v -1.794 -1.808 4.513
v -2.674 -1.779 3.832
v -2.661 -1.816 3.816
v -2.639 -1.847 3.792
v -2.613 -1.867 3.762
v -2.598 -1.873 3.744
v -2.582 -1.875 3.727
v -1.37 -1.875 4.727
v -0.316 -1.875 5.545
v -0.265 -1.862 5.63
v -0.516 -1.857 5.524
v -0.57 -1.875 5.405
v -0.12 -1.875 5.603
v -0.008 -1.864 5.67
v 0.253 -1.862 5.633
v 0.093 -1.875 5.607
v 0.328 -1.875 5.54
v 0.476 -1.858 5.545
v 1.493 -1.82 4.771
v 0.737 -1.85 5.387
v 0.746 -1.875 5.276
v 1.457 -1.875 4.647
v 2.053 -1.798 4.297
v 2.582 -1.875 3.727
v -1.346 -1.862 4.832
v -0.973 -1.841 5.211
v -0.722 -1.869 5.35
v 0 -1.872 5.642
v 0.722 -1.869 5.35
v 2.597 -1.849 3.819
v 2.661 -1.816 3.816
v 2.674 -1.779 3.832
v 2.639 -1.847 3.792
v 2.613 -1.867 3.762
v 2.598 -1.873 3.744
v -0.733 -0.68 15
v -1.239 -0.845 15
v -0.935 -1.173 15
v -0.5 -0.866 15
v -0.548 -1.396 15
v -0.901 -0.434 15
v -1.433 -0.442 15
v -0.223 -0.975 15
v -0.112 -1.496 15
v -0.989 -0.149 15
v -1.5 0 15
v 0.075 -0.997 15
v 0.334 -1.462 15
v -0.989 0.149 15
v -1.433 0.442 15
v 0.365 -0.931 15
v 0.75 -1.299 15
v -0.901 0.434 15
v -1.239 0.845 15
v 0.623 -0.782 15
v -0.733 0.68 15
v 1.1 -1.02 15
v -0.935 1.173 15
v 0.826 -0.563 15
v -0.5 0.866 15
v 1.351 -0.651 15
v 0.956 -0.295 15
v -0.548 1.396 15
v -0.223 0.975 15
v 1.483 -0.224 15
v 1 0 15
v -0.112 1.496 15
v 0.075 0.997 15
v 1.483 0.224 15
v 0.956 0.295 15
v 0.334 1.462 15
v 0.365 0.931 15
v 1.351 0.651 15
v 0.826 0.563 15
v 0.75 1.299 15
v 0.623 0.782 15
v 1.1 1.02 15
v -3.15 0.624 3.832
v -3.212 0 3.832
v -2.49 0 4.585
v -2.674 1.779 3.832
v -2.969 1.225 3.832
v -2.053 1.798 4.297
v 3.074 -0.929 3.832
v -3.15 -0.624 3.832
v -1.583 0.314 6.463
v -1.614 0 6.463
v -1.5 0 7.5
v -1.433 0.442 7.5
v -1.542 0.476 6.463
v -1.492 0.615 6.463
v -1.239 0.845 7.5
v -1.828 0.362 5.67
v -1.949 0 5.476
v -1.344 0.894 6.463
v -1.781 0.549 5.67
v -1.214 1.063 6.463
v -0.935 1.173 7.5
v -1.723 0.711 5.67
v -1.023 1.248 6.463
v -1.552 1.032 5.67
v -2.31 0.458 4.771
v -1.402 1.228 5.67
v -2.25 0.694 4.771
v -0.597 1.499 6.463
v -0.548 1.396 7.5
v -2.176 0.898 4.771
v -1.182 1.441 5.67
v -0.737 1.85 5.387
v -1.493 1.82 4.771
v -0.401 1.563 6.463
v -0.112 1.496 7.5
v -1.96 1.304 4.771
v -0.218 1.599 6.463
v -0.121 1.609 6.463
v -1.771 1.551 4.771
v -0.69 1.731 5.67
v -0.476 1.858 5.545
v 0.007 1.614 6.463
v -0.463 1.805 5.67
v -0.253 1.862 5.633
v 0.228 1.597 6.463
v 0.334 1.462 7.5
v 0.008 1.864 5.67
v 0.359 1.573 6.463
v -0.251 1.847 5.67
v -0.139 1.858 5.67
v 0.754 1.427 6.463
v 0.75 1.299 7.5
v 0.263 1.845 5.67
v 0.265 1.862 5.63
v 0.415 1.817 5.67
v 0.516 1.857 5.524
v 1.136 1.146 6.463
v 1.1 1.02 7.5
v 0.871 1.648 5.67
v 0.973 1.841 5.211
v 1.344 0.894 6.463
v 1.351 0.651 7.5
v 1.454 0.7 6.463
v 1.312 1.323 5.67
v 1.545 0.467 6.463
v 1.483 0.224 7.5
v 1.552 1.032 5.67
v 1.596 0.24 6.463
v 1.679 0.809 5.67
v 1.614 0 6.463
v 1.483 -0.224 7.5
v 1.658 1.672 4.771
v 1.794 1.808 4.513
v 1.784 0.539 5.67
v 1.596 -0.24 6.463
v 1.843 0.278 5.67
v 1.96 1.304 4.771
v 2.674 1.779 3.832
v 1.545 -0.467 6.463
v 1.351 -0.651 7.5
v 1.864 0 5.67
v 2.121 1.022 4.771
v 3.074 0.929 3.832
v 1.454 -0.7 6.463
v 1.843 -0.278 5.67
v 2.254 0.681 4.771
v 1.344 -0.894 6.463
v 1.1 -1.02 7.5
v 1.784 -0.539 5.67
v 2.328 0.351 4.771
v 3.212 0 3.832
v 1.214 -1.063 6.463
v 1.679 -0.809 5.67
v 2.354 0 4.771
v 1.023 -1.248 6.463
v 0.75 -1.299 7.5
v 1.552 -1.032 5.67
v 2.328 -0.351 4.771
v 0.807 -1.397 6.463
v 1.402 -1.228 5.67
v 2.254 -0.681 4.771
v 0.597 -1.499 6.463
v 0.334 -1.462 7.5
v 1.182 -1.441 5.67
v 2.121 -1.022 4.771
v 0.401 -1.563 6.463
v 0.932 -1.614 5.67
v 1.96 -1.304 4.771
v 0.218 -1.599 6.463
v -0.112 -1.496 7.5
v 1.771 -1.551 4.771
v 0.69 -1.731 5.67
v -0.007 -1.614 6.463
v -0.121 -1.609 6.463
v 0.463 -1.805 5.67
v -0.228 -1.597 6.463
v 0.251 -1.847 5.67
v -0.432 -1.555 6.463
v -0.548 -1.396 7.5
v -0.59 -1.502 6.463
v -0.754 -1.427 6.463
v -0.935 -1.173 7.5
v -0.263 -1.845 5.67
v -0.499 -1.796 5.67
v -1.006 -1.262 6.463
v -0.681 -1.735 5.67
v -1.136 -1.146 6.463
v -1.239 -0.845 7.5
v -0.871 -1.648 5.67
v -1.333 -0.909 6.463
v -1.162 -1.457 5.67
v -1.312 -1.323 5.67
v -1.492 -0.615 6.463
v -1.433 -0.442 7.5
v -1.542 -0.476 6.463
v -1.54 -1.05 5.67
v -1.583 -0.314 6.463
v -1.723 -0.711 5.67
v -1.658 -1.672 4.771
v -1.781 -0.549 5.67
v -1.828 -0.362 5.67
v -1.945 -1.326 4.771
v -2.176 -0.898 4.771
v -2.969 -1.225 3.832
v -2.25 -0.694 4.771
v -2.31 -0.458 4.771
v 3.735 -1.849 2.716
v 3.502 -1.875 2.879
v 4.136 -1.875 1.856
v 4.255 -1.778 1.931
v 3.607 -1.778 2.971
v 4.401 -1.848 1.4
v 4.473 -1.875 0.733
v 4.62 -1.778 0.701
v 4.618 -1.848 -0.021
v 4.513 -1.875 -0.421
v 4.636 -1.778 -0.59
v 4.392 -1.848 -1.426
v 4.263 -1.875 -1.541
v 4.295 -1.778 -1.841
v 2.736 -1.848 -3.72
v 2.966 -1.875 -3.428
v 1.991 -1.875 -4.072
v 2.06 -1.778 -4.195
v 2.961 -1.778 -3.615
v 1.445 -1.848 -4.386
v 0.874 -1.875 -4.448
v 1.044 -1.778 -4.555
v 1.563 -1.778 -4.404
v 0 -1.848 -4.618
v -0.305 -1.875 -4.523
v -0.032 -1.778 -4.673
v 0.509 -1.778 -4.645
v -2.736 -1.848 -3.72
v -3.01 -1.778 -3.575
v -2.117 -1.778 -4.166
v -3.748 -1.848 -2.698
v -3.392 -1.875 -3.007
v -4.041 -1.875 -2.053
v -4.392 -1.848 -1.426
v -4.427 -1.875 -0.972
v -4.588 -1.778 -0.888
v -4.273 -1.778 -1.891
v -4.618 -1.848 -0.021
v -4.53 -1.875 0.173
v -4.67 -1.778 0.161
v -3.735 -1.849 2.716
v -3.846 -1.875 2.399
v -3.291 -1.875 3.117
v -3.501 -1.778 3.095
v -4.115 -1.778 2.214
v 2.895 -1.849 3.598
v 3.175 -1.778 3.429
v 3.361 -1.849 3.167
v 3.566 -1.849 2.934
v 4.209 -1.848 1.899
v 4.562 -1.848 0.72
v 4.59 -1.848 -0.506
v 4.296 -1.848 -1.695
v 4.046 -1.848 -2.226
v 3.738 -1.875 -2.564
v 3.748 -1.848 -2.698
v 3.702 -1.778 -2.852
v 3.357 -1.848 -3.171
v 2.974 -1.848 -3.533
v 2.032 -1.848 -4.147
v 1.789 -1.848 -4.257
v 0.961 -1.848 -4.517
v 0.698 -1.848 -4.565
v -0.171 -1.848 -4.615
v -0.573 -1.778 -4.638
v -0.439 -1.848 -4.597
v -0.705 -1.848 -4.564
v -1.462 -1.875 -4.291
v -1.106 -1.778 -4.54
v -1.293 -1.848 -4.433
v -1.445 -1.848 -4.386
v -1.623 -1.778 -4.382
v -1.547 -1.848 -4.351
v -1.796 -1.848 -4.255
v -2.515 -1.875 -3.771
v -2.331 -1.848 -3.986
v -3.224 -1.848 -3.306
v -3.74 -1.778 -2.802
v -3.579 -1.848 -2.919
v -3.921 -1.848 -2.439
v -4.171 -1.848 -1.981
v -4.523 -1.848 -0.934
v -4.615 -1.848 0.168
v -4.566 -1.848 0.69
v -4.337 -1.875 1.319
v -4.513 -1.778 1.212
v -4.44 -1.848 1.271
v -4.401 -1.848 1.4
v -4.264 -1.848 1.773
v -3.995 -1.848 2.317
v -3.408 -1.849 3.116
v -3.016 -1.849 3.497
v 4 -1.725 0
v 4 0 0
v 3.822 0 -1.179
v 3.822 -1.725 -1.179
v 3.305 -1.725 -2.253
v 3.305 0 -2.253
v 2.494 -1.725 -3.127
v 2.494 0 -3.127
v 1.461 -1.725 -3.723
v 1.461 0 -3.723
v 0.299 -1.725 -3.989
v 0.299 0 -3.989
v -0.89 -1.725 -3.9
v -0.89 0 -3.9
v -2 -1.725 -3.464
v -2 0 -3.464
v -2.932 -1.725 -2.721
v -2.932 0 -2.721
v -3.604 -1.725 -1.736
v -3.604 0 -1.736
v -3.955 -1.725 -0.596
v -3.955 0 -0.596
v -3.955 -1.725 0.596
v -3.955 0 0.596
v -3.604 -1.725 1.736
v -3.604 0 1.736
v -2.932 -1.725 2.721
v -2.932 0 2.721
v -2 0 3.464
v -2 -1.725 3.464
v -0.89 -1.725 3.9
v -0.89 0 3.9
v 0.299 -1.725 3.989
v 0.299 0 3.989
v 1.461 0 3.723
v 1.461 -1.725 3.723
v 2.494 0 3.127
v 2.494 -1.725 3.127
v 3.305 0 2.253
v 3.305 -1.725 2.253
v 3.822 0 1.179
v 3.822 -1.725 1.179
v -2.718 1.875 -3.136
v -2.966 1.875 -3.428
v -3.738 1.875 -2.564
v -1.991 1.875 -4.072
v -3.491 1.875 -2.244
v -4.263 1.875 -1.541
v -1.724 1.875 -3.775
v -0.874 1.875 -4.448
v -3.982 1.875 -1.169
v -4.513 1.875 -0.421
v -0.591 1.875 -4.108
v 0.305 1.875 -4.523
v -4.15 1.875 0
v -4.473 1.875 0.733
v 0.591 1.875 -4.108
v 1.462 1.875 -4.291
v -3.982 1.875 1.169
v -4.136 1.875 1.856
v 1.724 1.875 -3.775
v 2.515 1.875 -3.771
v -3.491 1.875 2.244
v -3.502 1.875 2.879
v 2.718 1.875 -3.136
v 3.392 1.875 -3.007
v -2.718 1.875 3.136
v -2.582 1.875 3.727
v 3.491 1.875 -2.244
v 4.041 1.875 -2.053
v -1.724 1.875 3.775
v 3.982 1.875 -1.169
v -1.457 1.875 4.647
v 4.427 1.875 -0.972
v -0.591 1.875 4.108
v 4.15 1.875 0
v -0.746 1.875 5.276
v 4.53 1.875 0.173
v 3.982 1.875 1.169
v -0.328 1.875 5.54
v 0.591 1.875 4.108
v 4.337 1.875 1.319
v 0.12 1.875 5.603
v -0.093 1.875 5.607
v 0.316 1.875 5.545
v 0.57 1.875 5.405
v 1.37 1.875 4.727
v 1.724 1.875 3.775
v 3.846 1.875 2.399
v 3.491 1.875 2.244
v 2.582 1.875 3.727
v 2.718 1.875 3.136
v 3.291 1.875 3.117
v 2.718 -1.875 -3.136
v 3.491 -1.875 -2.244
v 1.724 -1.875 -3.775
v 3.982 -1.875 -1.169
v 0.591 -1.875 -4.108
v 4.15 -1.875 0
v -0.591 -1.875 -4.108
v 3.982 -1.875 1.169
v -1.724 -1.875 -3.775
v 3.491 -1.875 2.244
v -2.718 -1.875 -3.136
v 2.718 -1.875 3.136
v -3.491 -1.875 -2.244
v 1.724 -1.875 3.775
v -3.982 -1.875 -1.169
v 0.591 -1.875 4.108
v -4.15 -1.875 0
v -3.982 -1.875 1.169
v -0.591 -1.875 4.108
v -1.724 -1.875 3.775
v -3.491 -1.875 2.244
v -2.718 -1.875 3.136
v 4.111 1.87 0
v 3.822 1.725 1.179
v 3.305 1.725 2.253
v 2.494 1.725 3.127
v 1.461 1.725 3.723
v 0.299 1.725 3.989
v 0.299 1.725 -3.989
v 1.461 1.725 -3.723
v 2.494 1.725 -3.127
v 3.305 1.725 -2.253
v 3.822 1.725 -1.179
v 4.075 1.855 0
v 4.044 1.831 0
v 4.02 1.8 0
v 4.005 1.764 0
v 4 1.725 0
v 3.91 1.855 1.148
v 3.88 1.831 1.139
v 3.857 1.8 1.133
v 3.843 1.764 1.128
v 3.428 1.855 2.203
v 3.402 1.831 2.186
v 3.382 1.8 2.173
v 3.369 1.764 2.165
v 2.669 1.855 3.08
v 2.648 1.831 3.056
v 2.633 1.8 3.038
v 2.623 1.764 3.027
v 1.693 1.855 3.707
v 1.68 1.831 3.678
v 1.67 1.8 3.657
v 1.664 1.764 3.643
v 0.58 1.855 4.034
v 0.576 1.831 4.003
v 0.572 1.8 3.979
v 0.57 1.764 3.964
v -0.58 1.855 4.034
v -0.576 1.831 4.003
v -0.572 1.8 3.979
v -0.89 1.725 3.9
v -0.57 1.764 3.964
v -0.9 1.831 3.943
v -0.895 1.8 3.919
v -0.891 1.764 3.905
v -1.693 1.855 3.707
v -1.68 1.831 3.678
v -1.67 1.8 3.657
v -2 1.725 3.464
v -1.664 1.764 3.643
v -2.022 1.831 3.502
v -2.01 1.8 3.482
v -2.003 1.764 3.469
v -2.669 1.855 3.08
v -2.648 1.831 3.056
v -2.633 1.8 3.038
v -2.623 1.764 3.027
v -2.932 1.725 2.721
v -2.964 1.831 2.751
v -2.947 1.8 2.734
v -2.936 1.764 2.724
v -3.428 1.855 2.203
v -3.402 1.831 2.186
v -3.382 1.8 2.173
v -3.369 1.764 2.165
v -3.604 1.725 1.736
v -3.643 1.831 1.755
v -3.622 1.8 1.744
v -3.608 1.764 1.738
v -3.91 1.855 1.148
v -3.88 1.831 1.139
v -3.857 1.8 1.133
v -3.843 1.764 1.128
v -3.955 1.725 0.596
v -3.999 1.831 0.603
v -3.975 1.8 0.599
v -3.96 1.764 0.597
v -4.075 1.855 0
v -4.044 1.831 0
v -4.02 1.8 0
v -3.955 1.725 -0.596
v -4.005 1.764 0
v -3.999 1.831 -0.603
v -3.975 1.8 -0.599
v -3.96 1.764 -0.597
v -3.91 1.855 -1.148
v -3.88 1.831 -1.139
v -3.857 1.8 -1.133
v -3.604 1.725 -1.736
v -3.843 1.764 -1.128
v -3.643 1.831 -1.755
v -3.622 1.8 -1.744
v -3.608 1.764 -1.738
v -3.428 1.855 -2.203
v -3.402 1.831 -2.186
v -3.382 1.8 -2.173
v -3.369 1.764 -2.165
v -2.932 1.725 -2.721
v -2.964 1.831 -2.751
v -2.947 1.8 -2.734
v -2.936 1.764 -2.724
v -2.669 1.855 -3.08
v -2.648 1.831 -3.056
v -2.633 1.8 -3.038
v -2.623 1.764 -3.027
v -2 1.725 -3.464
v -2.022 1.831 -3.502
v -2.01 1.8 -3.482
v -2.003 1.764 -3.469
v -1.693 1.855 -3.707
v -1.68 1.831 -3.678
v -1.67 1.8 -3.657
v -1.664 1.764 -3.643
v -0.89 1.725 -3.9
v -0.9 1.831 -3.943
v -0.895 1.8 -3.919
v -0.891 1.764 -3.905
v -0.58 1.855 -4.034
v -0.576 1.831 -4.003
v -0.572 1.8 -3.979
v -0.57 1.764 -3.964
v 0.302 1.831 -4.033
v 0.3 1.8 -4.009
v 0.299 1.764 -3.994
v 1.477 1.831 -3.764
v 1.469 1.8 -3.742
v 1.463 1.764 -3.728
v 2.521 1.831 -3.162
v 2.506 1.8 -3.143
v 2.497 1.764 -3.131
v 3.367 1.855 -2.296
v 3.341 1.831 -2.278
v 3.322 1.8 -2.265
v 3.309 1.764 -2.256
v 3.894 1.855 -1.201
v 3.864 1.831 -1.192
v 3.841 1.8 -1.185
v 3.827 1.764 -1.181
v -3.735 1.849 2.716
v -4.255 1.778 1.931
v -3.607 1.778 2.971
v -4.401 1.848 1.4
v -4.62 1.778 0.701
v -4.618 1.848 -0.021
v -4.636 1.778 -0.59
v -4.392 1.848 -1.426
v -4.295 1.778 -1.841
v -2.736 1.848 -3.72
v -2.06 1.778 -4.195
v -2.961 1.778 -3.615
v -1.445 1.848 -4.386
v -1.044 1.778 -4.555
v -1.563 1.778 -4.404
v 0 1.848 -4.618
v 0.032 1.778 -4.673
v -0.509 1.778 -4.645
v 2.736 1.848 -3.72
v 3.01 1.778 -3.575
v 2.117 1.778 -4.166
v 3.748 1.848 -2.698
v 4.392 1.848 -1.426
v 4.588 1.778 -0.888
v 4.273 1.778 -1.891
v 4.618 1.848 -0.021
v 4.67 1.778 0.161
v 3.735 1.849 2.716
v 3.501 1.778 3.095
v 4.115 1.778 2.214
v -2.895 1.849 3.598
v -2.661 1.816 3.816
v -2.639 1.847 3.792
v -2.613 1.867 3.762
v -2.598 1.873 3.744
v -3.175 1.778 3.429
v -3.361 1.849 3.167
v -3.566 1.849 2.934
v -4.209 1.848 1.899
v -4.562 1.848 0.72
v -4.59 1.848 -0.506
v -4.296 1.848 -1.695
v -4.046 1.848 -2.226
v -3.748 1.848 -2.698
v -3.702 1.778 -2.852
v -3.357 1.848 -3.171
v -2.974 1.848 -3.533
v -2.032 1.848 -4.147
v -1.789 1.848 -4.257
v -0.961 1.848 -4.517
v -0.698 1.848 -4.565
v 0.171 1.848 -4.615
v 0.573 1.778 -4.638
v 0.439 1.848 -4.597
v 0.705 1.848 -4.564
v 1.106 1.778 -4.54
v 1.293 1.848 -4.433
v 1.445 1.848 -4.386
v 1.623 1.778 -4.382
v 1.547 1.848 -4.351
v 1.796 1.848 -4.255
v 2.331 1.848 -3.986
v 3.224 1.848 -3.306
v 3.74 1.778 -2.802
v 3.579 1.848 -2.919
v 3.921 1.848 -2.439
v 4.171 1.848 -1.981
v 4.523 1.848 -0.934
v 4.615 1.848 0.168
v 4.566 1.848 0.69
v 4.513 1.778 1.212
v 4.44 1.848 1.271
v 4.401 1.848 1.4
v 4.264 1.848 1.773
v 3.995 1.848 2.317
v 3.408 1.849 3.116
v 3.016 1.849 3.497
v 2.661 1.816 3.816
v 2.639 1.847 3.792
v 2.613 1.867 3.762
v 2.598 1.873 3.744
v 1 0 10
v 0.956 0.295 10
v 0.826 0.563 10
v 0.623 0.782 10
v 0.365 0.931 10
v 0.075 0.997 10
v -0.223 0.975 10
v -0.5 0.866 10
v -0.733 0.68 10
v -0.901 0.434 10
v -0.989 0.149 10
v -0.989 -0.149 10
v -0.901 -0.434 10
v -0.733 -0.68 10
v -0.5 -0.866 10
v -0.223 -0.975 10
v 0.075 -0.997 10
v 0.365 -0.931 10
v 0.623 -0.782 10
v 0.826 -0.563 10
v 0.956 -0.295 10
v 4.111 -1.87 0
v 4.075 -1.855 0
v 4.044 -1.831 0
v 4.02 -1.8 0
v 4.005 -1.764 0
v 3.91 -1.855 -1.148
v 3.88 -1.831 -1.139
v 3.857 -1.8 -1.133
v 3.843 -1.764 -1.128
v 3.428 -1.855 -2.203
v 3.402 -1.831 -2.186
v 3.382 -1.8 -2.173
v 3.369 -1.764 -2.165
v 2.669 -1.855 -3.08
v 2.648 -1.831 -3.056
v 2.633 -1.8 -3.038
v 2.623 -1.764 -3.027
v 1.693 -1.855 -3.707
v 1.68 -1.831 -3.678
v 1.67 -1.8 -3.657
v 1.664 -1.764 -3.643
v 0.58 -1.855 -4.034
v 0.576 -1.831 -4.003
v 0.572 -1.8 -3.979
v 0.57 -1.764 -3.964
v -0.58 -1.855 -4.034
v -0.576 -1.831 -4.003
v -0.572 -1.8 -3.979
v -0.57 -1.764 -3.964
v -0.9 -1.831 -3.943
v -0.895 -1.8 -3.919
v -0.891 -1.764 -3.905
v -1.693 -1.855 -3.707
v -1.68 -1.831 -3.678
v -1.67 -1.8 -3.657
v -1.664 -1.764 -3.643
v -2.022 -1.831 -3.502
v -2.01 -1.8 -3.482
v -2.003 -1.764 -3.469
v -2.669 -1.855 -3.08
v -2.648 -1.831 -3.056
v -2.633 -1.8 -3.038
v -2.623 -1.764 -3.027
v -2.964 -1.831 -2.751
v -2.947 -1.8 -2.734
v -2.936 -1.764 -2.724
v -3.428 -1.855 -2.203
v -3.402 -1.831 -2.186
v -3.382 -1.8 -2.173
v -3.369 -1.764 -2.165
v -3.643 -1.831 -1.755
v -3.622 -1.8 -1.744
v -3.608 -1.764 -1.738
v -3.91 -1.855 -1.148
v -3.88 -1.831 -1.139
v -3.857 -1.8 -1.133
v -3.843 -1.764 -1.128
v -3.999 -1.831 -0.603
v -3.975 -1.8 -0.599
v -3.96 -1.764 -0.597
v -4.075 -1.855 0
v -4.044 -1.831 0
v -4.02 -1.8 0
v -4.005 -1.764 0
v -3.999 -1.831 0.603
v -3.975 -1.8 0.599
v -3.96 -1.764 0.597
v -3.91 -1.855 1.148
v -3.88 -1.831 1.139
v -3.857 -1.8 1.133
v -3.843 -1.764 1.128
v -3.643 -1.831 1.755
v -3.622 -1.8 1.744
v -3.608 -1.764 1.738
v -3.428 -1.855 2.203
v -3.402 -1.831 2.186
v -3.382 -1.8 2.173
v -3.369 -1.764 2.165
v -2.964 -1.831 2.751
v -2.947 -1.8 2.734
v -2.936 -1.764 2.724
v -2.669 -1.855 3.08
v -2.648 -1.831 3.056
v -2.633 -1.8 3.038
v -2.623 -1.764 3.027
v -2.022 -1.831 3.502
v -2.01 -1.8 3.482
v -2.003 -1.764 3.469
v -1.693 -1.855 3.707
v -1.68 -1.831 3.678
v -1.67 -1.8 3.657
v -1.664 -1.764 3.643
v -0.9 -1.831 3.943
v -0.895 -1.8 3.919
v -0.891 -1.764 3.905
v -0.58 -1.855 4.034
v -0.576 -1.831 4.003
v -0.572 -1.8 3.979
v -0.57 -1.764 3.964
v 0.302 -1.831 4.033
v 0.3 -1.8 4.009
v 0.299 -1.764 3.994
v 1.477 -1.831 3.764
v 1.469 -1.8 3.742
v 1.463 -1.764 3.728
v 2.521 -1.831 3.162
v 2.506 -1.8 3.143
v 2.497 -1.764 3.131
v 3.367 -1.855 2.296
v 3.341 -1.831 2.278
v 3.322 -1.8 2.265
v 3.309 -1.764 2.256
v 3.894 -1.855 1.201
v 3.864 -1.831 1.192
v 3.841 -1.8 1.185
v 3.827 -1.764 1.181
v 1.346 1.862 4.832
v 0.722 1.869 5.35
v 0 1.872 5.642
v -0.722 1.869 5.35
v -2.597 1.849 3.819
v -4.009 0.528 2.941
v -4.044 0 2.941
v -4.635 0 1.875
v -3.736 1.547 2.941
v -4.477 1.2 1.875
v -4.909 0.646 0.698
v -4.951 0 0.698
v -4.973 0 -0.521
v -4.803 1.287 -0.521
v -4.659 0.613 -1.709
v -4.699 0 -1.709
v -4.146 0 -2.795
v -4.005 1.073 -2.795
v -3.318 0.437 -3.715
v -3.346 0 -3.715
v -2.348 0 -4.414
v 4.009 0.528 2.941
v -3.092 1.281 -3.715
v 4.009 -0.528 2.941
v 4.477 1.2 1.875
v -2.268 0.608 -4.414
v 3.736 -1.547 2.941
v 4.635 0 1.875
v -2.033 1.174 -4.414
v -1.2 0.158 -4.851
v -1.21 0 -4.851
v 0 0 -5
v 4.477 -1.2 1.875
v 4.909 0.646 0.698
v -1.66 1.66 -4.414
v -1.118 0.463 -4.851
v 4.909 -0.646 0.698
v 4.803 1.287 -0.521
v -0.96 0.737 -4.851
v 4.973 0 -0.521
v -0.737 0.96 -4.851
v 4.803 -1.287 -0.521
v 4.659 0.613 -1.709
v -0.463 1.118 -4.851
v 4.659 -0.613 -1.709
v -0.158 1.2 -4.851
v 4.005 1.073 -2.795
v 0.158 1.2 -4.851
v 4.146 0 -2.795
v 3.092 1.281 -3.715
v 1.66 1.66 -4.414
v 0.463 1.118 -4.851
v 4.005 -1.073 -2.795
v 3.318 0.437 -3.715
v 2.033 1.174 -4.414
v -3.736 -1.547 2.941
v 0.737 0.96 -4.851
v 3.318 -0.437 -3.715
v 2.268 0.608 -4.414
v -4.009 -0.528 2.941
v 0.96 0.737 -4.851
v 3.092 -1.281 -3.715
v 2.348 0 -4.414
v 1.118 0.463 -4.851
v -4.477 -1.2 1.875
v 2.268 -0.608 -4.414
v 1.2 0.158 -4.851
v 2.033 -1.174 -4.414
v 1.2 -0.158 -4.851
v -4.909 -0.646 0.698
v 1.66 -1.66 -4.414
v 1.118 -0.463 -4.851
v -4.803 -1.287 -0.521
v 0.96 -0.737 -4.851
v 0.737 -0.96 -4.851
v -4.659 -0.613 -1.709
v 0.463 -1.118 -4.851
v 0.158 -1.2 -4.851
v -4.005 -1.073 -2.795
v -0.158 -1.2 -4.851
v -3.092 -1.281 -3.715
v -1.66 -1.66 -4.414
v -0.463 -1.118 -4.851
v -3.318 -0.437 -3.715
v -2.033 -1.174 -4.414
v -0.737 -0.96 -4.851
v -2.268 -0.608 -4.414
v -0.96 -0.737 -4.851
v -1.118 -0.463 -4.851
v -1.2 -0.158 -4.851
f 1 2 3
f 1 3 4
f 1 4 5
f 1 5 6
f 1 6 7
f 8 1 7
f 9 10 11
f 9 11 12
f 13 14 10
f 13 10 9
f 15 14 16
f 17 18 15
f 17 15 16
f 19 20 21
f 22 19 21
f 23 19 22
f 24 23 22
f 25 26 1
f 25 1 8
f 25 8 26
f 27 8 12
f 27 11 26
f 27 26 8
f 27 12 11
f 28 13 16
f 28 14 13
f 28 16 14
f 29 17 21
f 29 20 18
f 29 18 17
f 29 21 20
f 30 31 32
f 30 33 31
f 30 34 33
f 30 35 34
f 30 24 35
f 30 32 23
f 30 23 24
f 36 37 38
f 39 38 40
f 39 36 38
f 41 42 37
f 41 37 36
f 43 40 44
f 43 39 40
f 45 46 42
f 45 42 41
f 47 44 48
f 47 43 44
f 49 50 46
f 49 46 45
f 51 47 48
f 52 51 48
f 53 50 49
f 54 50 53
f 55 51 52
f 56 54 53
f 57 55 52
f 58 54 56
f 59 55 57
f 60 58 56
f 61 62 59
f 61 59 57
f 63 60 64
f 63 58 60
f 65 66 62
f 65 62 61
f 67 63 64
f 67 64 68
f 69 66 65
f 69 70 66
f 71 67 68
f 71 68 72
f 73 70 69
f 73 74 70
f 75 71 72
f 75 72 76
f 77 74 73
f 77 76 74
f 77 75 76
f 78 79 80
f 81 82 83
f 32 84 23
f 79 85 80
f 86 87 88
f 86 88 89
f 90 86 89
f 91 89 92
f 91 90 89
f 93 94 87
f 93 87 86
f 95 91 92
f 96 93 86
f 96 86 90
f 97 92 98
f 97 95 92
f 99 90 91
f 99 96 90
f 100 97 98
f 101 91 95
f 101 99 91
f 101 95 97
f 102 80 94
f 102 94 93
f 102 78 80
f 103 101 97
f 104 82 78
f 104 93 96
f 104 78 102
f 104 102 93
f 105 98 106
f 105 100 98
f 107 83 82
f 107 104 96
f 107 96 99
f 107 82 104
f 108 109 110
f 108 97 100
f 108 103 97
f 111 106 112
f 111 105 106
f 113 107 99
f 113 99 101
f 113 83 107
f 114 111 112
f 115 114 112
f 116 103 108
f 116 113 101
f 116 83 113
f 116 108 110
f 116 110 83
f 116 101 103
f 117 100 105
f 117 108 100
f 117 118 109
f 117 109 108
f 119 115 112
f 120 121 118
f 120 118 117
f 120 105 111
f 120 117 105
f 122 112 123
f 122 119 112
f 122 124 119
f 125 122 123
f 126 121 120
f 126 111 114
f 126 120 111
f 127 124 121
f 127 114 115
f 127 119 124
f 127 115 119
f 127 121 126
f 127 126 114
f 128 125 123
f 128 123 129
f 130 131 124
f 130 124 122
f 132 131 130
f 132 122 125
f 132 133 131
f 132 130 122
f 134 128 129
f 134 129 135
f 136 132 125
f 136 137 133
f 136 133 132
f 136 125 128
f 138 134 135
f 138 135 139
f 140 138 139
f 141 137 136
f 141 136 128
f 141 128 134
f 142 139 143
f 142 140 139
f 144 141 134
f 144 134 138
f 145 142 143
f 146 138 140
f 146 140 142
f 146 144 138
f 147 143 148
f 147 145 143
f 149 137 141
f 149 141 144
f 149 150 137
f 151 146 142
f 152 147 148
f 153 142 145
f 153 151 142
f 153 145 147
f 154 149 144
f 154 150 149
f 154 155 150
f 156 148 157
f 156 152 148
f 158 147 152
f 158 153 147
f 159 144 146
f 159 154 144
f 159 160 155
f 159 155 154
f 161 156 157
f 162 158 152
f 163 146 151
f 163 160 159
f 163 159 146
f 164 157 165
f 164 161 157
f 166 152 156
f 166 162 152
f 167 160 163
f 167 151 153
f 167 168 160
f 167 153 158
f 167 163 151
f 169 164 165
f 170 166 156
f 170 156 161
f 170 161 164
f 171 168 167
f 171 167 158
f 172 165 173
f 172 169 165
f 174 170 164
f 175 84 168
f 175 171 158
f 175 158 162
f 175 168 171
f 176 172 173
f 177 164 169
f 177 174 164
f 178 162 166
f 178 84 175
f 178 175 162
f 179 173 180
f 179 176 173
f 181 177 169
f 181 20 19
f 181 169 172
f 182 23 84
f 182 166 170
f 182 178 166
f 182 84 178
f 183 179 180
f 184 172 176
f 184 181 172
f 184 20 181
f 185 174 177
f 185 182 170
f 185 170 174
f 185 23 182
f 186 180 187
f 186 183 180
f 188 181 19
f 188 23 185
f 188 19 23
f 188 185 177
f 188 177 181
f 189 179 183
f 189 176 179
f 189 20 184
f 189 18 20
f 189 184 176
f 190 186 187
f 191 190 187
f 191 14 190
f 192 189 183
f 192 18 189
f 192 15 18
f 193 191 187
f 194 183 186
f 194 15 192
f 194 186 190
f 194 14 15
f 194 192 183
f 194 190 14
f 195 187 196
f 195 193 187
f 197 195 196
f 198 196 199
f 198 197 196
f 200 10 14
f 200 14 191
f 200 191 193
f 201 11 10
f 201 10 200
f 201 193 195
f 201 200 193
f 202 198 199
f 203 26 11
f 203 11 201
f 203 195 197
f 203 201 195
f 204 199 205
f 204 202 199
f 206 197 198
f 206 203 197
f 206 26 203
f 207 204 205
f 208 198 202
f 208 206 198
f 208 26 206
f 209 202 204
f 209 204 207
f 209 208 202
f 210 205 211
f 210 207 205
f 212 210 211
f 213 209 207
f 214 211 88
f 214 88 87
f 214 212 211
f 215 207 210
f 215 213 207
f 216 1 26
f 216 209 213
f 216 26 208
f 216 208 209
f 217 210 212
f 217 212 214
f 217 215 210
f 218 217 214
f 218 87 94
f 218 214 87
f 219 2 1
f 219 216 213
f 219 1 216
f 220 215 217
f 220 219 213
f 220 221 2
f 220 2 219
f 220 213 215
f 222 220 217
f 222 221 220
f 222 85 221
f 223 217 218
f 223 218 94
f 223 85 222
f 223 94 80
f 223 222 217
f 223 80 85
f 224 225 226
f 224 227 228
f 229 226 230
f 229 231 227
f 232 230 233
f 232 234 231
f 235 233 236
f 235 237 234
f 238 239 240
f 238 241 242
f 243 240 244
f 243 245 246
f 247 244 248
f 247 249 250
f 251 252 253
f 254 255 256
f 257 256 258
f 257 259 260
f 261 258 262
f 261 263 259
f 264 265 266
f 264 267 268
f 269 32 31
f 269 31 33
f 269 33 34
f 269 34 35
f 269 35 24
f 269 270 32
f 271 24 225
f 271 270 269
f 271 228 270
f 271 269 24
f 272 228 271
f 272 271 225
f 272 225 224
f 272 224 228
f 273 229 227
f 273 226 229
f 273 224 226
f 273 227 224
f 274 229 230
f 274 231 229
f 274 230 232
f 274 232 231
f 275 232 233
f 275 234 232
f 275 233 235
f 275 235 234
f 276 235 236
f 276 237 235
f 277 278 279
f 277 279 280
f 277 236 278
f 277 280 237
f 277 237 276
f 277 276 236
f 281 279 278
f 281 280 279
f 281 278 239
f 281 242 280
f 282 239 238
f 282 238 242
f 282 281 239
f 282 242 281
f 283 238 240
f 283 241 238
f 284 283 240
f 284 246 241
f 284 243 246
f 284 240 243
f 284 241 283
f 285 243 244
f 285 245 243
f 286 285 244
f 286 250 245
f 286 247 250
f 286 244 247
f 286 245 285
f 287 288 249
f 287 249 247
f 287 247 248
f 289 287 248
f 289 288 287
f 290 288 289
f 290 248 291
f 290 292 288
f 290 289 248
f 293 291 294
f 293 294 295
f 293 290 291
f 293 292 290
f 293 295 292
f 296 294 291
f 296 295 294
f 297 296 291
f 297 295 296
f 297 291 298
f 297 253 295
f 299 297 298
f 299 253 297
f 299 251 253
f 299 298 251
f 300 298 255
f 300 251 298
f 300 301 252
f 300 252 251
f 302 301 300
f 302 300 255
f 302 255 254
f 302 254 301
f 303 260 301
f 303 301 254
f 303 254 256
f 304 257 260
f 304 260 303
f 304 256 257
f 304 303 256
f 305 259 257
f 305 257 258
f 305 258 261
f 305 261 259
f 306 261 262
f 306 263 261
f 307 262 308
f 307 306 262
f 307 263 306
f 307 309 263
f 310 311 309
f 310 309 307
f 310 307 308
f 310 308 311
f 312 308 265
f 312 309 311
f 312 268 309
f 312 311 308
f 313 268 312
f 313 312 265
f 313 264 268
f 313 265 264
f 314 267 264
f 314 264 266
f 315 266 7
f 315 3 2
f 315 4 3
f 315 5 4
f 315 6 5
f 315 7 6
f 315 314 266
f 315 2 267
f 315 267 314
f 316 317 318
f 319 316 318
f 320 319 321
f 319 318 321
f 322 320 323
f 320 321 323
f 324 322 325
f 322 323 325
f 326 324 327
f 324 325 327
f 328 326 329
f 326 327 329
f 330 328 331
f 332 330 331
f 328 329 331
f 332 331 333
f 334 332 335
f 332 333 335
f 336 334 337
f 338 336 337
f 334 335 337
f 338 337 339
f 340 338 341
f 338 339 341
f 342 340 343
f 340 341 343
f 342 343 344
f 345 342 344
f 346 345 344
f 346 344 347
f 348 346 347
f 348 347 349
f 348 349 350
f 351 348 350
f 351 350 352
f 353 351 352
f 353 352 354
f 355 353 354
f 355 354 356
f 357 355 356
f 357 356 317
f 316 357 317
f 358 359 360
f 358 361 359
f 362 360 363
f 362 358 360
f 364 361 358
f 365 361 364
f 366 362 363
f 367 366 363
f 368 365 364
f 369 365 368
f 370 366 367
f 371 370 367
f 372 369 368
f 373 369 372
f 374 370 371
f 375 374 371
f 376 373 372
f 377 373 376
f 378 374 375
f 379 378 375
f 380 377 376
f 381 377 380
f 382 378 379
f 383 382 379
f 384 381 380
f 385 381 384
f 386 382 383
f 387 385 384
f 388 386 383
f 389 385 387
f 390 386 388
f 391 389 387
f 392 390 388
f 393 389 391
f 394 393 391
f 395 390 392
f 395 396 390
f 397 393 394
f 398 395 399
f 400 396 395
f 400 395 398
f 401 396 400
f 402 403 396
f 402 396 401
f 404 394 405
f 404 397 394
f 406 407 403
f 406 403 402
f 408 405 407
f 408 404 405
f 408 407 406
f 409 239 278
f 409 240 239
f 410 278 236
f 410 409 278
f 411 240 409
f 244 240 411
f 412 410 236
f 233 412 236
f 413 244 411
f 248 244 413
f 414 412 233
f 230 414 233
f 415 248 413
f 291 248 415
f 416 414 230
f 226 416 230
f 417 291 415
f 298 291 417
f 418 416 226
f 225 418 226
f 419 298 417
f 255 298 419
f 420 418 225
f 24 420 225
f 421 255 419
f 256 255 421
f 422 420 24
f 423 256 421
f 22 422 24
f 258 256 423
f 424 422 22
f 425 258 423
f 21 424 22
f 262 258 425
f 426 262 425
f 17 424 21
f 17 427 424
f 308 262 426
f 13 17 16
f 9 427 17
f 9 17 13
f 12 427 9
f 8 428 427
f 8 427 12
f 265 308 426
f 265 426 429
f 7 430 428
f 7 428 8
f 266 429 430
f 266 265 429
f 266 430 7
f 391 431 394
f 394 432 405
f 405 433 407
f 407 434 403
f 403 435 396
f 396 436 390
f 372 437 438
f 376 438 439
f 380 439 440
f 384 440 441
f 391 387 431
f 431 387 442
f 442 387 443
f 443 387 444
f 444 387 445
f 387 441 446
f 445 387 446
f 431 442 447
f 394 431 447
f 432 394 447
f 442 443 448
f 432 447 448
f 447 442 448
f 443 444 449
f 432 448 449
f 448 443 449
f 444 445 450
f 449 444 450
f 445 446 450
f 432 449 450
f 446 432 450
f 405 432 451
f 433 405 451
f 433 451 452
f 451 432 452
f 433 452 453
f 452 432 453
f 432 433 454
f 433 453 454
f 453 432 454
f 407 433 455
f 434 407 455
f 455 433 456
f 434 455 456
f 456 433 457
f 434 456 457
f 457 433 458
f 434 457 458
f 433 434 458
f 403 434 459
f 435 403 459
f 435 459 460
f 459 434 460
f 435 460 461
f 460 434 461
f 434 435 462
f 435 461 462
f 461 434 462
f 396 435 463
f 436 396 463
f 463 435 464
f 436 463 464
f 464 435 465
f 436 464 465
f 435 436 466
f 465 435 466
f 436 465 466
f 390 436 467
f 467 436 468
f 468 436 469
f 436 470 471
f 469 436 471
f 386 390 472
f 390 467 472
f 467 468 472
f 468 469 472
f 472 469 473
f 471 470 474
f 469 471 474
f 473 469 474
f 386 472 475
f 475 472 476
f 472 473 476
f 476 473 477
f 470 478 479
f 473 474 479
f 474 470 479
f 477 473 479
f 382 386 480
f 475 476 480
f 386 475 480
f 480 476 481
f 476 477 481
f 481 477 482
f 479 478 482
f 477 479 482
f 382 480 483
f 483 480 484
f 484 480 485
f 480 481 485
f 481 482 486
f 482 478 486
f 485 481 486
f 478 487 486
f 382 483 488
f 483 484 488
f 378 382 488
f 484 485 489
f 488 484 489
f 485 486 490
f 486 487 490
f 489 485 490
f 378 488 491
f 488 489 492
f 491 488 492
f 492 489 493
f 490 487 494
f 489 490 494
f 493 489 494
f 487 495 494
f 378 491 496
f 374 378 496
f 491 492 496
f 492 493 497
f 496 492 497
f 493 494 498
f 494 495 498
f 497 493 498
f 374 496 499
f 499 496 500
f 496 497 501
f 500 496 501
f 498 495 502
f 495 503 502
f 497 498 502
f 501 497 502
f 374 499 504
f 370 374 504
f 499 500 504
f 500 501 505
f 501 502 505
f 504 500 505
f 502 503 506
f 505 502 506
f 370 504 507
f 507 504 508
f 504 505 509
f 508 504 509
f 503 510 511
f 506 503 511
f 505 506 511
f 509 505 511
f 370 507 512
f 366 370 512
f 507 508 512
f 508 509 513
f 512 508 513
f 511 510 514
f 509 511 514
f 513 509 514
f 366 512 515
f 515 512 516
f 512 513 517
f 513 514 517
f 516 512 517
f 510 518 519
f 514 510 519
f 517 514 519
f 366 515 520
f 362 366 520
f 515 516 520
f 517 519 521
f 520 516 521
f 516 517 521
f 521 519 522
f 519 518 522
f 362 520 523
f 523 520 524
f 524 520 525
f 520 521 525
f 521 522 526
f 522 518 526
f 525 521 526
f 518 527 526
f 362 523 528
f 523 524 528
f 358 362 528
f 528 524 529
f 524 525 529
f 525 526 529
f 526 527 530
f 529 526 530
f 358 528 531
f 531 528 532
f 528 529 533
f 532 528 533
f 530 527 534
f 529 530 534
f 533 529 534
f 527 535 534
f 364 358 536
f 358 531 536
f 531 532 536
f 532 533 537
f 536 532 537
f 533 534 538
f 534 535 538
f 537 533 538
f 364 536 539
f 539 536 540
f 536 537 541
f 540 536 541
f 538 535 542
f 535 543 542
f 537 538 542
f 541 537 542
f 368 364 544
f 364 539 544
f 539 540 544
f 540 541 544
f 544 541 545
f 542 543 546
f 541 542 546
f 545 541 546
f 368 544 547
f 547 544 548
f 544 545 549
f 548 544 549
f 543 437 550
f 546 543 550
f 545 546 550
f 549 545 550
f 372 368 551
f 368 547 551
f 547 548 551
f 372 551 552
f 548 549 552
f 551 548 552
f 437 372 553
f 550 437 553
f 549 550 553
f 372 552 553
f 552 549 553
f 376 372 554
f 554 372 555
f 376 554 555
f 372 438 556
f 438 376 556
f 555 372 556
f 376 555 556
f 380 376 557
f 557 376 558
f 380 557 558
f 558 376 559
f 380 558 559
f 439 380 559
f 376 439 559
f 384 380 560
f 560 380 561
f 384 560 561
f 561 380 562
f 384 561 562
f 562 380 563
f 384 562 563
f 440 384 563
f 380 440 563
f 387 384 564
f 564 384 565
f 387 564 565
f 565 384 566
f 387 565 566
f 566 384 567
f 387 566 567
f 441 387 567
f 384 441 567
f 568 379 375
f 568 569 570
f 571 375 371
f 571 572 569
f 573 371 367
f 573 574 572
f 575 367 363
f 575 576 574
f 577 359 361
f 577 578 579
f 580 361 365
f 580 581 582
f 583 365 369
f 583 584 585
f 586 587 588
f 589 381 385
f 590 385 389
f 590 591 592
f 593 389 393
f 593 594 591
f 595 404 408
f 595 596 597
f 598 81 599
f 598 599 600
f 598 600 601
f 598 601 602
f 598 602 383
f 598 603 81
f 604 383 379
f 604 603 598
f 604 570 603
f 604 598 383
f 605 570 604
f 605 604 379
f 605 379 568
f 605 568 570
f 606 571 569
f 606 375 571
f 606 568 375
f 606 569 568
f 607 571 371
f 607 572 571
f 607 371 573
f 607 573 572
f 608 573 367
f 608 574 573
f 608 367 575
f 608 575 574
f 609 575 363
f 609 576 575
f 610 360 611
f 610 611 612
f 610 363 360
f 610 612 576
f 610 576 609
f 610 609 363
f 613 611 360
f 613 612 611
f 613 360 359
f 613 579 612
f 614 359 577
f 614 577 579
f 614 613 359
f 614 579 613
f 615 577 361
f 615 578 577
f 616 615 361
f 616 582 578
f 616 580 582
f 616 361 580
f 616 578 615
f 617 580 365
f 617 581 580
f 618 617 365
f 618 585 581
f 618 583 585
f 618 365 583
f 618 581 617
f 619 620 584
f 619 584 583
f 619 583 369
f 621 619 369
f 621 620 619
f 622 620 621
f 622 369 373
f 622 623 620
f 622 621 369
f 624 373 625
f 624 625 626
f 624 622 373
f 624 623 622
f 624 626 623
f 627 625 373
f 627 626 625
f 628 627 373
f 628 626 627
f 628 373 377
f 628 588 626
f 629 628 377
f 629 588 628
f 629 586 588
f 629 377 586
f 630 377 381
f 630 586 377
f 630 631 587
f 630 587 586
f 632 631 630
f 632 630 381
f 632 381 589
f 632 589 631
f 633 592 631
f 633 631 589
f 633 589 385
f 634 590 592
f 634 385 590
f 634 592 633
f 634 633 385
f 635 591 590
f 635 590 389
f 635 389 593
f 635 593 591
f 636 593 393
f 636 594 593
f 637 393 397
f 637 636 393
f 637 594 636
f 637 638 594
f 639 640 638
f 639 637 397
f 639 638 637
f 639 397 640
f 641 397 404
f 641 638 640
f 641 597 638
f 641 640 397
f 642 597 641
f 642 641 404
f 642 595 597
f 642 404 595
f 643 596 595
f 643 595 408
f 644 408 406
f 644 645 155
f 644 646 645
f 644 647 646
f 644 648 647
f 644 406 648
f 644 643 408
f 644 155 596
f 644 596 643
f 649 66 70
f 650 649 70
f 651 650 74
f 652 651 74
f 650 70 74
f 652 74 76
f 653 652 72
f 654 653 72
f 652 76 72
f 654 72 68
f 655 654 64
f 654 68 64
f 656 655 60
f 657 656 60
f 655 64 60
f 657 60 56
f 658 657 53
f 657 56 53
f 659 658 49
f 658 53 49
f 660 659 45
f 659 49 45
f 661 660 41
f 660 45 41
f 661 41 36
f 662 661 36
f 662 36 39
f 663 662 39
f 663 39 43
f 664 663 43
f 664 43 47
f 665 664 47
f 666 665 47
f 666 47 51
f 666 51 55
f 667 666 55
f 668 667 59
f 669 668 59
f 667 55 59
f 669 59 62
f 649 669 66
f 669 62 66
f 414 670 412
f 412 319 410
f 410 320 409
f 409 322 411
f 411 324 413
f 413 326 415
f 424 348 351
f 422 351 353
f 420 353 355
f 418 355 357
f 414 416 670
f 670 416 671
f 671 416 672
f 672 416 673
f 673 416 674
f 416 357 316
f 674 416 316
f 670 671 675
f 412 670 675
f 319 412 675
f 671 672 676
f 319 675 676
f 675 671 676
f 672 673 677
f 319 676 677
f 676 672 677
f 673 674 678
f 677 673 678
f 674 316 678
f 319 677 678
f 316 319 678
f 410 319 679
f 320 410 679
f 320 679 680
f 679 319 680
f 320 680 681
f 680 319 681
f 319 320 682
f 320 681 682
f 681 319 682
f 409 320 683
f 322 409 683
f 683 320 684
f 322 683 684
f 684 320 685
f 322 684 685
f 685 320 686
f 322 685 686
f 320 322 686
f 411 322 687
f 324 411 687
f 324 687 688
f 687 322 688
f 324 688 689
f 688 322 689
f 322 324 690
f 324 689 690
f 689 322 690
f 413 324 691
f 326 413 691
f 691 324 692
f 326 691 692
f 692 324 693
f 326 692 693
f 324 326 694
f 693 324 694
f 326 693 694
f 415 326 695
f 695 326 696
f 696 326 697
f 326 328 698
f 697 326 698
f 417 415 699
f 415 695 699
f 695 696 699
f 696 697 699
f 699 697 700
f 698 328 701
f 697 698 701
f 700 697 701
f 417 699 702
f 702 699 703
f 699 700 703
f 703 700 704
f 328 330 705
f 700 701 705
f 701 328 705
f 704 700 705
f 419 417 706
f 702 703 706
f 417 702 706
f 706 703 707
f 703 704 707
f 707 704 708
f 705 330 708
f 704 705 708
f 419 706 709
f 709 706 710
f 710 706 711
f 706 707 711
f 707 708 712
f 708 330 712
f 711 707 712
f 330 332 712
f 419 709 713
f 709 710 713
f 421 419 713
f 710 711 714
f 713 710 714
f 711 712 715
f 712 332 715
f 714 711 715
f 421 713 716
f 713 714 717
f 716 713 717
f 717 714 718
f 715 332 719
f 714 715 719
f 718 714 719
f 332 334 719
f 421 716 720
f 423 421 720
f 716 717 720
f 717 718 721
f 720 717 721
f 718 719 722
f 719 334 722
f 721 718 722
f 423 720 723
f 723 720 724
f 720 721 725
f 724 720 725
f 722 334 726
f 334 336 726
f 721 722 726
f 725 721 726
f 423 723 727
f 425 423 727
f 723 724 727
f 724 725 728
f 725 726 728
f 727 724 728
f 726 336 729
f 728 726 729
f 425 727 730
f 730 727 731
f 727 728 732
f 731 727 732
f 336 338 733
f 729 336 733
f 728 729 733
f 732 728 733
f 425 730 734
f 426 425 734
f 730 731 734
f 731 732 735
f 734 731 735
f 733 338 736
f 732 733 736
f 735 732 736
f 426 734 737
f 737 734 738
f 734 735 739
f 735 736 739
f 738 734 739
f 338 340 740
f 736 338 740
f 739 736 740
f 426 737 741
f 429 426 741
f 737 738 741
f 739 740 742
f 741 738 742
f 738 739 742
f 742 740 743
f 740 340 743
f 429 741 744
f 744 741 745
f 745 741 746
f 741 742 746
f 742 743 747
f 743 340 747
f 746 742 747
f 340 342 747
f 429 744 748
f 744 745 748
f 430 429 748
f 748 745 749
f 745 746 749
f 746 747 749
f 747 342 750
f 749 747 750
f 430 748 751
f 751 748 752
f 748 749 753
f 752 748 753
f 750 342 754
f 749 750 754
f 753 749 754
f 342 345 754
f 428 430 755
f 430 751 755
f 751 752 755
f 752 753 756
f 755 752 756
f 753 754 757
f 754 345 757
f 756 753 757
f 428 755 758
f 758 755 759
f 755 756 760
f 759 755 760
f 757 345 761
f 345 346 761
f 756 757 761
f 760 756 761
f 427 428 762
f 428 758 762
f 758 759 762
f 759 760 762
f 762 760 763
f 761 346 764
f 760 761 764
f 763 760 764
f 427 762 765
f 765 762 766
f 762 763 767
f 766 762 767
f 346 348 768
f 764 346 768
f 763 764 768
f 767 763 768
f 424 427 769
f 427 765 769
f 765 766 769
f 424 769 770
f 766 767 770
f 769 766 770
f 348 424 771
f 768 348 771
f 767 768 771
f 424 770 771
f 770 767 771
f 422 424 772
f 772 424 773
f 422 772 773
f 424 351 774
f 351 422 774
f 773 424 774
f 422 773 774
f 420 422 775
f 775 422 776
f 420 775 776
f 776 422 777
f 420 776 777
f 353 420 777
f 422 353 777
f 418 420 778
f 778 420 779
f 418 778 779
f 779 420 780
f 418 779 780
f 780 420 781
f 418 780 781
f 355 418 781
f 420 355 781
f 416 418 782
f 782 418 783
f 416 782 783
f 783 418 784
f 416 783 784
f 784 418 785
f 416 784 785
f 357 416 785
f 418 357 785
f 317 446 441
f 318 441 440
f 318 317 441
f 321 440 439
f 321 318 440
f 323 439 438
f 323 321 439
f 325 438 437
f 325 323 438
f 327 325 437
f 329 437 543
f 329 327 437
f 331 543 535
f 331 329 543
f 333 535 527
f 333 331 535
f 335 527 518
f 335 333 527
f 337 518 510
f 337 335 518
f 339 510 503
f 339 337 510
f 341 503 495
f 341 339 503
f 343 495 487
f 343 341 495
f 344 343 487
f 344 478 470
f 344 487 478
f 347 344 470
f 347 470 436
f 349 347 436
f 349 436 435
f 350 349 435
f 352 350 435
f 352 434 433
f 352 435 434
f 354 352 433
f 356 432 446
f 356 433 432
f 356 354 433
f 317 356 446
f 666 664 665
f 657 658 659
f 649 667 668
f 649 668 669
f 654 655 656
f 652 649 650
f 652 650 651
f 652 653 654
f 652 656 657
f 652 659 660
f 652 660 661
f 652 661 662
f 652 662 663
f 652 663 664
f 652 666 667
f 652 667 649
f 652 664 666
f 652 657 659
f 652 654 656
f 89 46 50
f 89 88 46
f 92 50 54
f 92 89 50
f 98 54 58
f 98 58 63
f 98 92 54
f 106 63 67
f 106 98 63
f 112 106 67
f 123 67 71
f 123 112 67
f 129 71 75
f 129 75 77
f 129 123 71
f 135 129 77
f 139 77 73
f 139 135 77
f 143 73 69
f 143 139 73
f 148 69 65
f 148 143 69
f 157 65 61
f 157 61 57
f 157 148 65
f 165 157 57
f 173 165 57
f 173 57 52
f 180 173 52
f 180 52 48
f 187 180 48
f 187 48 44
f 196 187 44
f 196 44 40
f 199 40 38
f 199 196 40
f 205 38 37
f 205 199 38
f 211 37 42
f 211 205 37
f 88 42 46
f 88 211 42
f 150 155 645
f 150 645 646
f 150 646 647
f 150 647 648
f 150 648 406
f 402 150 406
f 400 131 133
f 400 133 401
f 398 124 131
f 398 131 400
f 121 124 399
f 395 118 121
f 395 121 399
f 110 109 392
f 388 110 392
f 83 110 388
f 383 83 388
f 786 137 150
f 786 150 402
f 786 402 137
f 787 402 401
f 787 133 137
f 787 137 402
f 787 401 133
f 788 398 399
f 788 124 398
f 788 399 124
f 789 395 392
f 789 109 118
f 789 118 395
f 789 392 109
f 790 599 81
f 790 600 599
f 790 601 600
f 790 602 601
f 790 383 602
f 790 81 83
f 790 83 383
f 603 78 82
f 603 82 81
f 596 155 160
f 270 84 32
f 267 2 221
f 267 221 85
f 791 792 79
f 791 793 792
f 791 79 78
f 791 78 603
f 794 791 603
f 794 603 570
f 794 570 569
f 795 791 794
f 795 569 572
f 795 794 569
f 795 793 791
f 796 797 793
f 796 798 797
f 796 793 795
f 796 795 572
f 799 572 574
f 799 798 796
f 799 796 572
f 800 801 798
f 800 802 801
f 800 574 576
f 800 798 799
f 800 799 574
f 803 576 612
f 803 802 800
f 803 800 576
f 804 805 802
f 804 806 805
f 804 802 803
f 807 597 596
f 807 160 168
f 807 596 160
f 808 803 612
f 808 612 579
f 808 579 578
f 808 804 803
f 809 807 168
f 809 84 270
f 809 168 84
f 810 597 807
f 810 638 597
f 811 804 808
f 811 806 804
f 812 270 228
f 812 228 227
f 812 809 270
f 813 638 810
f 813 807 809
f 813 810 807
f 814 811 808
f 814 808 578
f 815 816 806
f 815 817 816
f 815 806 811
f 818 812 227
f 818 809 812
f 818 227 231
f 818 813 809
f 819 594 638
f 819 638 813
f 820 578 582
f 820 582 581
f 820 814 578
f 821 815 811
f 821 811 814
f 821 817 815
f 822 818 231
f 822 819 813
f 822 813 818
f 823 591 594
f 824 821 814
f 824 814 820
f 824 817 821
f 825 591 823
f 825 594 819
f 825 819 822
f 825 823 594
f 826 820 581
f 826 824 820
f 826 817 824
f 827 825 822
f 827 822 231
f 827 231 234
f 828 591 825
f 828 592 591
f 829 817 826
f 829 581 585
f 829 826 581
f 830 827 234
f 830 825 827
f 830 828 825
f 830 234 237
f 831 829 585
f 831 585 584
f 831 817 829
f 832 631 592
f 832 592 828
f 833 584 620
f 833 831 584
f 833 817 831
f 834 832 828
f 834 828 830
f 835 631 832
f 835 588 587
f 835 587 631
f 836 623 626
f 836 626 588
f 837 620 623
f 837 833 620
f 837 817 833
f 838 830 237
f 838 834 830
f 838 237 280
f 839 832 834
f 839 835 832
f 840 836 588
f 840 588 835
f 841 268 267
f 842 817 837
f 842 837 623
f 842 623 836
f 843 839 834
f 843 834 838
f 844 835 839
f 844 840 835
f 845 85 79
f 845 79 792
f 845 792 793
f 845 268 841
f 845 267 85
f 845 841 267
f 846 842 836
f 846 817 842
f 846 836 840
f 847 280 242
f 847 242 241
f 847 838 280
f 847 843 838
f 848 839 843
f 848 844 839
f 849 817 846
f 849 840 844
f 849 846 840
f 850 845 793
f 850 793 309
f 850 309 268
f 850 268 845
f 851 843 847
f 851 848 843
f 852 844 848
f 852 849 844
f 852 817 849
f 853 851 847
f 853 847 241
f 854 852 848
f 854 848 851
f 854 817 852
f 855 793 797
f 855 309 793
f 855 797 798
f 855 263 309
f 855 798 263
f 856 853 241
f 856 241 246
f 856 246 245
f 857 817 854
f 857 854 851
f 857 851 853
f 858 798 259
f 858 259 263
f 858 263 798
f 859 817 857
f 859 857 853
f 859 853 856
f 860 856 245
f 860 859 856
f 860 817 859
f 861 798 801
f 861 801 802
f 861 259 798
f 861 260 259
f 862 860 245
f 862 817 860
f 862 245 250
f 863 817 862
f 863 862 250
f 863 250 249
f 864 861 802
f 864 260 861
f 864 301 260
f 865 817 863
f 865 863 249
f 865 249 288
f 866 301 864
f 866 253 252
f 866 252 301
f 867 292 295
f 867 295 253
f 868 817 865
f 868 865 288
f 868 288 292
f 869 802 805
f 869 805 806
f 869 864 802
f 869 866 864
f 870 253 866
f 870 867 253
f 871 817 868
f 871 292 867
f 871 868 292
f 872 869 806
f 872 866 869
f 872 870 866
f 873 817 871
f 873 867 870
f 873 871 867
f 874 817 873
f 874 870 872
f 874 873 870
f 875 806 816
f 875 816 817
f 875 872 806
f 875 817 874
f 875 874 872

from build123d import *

# Parameters (mm, degrees)
CUT_EXTRUDE1_DEPTH      = 6
CUT_EXTRUDE1_DEPTH_BACK = 6
SKETCH5_R               = 4
CUT_EXTRUDE2_DEPTH      = 2.8750001
CUT_EXTRUDE2_DEPTH_BACK = 2.8750001
FILLET1_R               = 0.15
SKETCH6_R               = 1
CUT_EXTRUDE3_DEPTH      = 5


with BuildPart() as part:
    # Sketch2 → Revolve1 (revolve)
    with BuildSketch(Plane(origin=(0, 0, 0), x_dir=(1, 0, 0), z_dir=(0, 1, 0))):
        with BuildLine():
            Line((-1.5, -15), (-1.5, -7.5))
            ThreePointArc((-1.5, -7.5), (-1.948980687, -5.476190987), (-3.211678832, -3.832116788))
            ThreePointArc((-3.211678832, -3.832116788), (-4.698967117, 1.708715315), (0, 5))
            Line((0, 5), (0, -15))
            Line((0, -15), (-1.5, -15))
        make_face()
    revolve(axis=Axis((0, 0, 0), (0, 0, -1)))

    # Sketch4 → Cut-Extrude1 (cut, two sides)
    with BuildSketch(Plane(origin=(0, 0, 0), x_dir=(0, 0, -1), z_dir=(1, 0, 0))) as cut_extrude1_sk:
        with BuildLine():
            Line((8.781517746, 1.875), (-9.267406652, 1.875))
            ThreePointArc((-9.267406652, 1.875), (-10.77093565, 2.106415246), (-12.135288834, 2.779239779))
            Line((-12.135288834, 2.779239779), (-18.987551921, 7.577246046))
            Line((-18.987551921, 7.577246046), (8.781517746, 7.577246046))
            Line((8.781517746, 7.577246046), (8.781517746, 1.875))
        make_face()
        with BuildLine():
            Line((8.781517746, -7.577246046), (8.781517746, -1.875))
            Line((8.781517746, -1.875), (-9.267406652, -1.875))
            ThreePointArc((-9.267406652, -1.875), (-10.77093565, -2.106415246), (-12.135288834, -2.779239779))
            Line((-12.135288834, -2.779239779), (-18.987551921, -7.577246046))
            Line((-18.987551921, -7.577246046), (8.781517746, -7.577246046))
        make_face()
    extrude(amount=CUT_EXTRUDE1_DEPTH, mode=Mode.SUBTRACT)
    extrude(cut_extrude1_sk.sketch, amount=-CUT_EXTRUDE1_DEPTH_BACK, mode=Mode.SUBTRACT)

    # Sketch5 → Cut-Extrude2 (cut, two sides)
    with BuildSketch(Plane(origin=(0, 0, 0), x_dir=(1, 0, 0), z_dir=(0, 1, 0))) as cut_extrude2_sk:
        Circle(SKETCH5_R)
    extrude(amount=CUT_EXTRUDE2_DEPTH, mode=Mode.SUBTRACT)
    extrude(cut_extrude2_sk.sketch, amount=-CUT_EXTRUDE2_DEPTH_BACK, mode=Mode.SUBTRACT)

    # Fillet1
    fillet1_edges = [part.edges().sort_by_distance(p)[0] for p in [
        (0, -1.875, -4.635124054),
        (0, 1.875, -4.635124054),
        (-1e-09, 1.875, 5.642942998),
        (1e-09, -1.875, 5.642942998),
        (-4, -1.875, 0),
        (-4, 1.875, 0),
    ]]
    fillet(fillet1_edges, radius=FILLET1_R)

    # Sketch6 → Cut-Extrude3 (cut)
    with BuildSketch(Plane.XY.offset(15)):
        Circle(SKETCH6_R)
    extrude(amount=-CUT_EXTRUDE3_DEPTH, mode=Mode.SUBTRACT)


solid = part.part
